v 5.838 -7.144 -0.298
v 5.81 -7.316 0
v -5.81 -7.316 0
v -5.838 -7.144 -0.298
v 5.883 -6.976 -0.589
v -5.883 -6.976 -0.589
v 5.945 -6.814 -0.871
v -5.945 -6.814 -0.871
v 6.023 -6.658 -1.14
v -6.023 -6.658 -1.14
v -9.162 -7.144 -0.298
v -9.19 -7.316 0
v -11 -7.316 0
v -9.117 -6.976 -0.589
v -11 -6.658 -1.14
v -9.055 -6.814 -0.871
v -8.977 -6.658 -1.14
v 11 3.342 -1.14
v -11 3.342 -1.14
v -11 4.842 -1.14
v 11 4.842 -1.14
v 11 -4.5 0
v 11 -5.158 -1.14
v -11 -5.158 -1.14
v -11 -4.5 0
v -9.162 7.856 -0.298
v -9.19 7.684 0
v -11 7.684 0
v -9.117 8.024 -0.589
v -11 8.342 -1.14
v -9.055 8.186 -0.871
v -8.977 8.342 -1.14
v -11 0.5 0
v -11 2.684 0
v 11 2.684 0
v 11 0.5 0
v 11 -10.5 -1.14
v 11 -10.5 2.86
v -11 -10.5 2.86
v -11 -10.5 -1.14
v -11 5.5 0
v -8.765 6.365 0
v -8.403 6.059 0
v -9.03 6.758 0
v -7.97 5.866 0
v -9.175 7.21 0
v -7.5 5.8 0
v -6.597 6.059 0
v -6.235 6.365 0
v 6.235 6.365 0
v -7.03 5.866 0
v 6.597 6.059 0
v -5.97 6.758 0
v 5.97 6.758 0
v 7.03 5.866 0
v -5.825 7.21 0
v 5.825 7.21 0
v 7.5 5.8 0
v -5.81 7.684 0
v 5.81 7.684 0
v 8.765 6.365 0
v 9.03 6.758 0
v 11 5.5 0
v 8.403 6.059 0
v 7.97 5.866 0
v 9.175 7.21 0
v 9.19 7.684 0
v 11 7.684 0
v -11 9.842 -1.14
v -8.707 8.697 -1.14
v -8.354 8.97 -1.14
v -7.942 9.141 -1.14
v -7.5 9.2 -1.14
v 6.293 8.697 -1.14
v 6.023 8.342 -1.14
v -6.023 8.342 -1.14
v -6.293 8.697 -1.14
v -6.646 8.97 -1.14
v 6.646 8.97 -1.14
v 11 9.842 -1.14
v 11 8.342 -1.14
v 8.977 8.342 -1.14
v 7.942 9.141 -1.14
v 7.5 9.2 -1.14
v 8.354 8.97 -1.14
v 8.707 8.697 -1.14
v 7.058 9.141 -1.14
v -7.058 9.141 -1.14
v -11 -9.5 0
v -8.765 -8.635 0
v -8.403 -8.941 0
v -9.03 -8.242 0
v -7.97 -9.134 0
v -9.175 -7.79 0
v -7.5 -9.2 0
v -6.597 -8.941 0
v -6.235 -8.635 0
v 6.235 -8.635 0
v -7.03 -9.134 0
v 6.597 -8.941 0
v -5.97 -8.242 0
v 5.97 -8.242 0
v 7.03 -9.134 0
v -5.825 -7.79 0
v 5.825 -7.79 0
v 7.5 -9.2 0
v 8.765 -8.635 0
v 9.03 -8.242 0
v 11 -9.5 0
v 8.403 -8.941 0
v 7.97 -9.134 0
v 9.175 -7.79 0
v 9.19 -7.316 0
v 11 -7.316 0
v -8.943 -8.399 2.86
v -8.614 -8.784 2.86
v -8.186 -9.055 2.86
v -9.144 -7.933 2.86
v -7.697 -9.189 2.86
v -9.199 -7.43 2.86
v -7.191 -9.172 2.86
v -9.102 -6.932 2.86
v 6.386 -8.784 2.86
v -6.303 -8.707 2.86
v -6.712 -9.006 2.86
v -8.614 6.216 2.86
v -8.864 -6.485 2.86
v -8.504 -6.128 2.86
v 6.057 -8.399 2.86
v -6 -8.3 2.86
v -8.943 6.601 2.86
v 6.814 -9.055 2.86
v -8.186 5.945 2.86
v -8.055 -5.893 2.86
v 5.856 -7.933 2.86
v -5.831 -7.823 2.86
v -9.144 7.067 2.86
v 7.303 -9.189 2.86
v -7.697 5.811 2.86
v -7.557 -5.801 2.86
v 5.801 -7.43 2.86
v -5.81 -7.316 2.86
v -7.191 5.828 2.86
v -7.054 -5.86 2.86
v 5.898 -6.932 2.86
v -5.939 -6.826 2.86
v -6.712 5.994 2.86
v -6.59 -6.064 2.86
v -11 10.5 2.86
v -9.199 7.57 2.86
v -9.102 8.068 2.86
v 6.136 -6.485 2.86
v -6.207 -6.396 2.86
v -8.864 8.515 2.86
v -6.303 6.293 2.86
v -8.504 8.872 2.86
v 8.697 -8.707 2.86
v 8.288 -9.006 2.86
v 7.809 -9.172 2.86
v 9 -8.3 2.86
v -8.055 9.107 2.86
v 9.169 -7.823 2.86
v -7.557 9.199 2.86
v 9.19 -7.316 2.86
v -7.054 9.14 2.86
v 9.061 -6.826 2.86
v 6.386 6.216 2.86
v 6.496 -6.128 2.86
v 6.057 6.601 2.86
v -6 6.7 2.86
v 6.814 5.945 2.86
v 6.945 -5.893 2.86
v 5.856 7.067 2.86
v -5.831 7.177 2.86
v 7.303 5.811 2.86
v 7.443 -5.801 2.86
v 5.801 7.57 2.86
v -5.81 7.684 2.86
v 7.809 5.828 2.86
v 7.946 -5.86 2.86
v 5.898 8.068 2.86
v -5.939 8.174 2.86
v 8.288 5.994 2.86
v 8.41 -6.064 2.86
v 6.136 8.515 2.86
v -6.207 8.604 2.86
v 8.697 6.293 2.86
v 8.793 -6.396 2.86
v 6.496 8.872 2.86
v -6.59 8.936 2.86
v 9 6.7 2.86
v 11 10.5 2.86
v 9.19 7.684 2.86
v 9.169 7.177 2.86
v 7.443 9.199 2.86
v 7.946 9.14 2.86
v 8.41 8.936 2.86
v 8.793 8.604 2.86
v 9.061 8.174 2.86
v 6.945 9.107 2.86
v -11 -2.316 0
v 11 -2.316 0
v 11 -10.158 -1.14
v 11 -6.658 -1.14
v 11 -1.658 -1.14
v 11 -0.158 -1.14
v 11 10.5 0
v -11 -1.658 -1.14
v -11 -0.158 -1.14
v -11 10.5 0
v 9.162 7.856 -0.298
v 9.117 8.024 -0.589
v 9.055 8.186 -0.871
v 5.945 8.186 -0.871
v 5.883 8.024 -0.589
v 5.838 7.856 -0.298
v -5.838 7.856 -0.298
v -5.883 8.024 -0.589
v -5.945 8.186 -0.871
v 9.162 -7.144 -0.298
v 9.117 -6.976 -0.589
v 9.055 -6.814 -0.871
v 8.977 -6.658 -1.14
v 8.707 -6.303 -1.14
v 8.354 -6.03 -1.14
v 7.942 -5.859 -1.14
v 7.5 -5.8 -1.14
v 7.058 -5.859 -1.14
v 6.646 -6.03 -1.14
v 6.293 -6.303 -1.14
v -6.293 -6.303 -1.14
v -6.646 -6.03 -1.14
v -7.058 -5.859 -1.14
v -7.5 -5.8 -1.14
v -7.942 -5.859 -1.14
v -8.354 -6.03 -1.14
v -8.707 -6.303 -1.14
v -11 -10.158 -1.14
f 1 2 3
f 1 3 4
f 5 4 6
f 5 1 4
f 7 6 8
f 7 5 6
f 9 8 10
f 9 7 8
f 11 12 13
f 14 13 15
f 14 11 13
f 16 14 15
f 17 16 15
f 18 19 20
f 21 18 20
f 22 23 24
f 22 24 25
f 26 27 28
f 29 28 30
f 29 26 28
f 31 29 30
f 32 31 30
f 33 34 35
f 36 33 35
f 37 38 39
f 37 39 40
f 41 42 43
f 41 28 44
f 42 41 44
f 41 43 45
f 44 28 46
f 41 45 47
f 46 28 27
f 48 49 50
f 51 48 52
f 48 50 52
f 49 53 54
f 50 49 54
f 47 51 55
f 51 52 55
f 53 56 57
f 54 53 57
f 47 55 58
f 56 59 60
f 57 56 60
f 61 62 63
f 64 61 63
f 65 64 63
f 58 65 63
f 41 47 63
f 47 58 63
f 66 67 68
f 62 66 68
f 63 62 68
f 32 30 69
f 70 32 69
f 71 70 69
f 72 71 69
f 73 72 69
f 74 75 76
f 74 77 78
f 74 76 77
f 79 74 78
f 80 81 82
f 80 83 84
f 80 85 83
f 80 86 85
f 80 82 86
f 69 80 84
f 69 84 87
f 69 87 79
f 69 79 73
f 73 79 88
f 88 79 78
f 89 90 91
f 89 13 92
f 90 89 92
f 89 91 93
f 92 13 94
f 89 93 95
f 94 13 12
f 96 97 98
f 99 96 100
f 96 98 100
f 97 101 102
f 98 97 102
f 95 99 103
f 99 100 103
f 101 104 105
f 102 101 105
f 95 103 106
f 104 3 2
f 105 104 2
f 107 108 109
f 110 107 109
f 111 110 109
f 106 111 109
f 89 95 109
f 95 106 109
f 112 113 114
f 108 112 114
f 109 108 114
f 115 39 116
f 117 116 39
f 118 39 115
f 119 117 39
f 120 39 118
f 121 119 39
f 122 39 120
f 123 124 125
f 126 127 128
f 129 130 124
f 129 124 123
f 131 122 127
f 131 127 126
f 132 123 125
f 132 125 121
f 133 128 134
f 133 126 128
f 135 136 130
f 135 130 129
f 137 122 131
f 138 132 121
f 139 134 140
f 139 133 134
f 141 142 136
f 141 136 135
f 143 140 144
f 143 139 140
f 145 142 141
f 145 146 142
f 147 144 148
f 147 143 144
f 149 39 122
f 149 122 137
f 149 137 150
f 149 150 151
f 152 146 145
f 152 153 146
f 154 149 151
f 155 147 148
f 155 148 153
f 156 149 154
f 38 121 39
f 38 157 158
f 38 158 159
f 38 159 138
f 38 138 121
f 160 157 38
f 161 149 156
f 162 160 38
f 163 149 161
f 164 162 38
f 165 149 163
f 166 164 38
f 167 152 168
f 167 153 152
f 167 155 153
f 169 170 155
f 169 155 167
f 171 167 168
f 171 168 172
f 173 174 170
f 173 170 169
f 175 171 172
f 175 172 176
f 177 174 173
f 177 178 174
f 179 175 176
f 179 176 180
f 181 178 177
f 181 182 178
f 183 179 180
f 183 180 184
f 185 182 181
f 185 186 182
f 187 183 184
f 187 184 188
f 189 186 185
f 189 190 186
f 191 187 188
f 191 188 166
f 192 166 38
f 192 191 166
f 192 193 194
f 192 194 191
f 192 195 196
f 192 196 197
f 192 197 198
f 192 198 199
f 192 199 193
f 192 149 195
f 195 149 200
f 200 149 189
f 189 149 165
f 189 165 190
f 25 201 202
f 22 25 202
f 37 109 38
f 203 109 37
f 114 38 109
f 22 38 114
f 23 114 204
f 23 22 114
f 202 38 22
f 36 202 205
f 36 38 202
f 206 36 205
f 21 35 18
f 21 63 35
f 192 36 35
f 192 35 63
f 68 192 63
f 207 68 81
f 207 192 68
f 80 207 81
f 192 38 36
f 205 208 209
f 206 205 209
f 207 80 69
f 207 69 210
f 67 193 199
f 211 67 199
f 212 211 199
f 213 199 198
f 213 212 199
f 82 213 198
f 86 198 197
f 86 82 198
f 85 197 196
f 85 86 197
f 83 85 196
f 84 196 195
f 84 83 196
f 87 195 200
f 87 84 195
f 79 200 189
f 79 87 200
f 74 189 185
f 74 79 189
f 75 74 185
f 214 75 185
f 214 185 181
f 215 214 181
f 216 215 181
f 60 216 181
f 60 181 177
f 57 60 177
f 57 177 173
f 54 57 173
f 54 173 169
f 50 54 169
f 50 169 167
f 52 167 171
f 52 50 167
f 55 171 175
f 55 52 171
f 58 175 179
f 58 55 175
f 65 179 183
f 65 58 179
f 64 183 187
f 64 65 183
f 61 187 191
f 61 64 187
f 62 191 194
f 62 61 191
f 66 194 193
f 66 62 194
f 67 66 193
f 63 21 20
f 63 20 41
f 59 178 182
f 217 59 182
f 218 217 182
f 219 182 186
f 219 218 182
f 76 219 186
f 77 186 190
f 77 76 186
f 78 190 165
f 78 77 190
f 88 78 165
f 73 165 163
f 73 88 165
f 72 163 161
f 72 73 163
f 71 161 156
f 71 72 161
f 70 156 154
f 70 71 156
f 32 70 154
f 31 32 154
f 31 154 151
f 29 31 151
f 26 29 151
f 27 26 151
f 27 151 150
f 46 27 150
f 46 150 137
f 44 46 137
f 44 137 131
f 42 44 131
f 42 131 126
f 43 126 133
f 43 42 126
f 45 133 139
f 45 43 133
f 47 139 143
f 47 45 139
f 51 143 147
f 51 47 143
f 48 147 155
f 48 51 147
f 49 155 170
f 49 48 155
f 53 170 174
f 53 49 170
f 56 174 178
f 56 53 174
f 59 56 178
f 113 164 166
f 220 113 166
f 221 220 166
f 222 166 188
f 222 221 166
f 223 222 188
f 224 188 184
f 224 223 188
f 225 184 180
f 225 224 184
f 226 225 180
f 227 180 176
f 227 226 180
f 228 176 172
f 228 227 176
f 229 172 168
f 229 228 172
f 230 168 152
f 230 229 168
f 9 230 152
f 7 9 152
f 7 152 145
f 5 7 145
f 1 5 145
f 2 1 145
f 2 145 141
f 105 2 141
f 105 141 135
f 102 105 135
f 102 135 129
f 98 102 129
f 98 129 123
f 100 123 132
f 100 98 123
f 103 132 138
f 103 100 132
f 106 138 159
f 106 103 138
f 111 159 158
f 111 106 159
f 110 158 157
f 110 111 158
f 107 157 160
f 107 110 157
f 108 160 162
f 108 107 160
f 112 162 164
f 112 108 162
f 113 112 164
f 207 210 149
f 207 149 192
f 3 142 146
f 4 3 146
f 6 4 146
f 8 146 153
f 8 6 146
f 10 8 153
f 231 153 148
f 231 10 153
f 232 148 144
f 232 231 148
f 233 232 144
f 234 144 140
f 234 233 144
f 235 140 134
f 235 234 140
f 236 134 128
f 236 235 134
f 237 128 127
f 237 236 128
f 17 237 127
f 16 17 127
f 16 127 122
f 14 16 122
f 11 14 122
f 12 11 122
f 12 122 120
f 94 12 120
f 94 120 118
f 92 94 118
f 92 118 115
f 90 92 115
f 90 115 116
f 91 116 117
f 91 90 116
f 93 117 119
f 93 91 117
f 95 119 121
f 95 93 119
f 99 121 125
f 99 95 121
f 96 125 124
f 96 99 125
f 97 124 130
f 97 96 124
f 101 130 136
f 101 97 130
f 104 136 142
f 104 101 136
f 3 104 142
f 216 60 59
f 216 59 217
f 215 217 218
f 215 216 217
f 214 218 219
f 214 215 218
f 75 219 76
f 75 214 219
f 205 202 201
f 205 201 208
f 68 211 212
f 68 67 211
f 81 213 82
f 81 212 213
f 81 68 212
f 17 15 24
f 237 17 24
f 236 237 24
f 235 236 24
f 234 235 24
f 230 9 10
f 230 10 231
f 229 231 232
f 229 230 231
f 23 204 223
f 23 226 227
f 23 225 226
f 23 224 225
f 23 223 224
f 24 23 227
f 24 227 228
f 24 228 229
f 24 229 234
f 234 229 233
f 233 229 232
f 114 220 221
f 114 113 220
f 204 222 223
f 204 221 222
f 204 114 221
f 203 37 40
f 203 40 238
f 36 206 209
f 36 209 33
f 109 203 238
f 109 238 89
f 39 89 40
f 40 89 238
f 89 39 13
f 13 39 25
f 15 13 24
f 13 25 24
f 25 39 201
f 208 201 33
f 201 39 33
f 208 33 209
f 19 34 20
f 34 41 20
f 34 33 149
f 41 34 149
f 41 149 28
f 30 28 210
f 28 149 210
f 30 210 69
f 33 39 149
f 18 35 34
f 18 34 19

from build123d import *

# Parameters (mm, degrees)
SKETCH_1_W               = 22
SKETCH_1_H               = 21
EXTRUDE_1_DEPTH          = 2.86
EXTRUDE_2_DEPTH          = 22
CUT_EXTRUDE_1_DEPTH      = 16.724185194
CUT_EXTRUDE_1_DEPTH_BACK = 16.724185194
SKETCH_3_R               = 1.7


with BuildPart() as part:
    # 草图1 → 凸台-拉伸1 (new body)
    with BuildSketch(Plane.XY):
        Rectangle(SKETCH_1_W, SKETCH_1_H)
    extrude(amount=EXTRUDE_1_DEPTH)

    # 草图2 → 凸台-拉伸2 (add)
    with BuildSketch(Plane(origin=(11, 0, 0), x_dir=(0, 0, -1), z_dir=(1, 0, 0))):
        Polygon((1.14, -10.158179307), (0, -9.5), (0, -10.5), (1.14, -10.5), align=None)
        Polygon((1.14, -5.158179307), (0, -4.5), (0, -7.316358614), (1.14, -6.658179307), align=None)
        Polygon((1.14, -0.158179307), (0, 0.5), (0, -2.316358614), (1.14, -1.658179307), align=None)
        Polygon((1.14, 4.841820693), (0, 5.5), (0, 2.683641386), (1.14, 3.341820693), align=None)
        Polygon((1.14, 9.841820693), (0, 10.5), (0, 7.683641386), (1.14, 8.341820693), align=None)
    extrude(amount=-EXTRUDE_2_DEPTH)

    # 草图3 → 切除-拉伸1 (cut, two sides: drawn at the far end of the back side and taken through both)
    with BuildSketch(Plane.XY.offset(2.86).offset(-CUT_EXTRUDE_1_DEPTH_BACK)):
        with Locations(Location((7.5, 7.5, 0), (0, 0, 6.201440198))):
            Circle(SKETCH_3_R)
        with Locations(Location((7.5, -7.5, 0), (0, 0, 6.201440198))):
            Circle(SKETCH_3_R)
        with Locations(Location((-7.5, -7.5, 0), (0, 0, 6.201440198))):
            Circle(SKETCH_3_R)
        with Locations(Location((-7.5, 7.5, 0), (0, 0, 6.201440198))):
            Circle(SKETCH_3_R)
    extrude(amount=CUT_EXTRUDE_1_DEPTH + CUT_EXTRUDE_1_DEPTH_BACK, mode=Mode.SUBTRACT)


solid = part.part
